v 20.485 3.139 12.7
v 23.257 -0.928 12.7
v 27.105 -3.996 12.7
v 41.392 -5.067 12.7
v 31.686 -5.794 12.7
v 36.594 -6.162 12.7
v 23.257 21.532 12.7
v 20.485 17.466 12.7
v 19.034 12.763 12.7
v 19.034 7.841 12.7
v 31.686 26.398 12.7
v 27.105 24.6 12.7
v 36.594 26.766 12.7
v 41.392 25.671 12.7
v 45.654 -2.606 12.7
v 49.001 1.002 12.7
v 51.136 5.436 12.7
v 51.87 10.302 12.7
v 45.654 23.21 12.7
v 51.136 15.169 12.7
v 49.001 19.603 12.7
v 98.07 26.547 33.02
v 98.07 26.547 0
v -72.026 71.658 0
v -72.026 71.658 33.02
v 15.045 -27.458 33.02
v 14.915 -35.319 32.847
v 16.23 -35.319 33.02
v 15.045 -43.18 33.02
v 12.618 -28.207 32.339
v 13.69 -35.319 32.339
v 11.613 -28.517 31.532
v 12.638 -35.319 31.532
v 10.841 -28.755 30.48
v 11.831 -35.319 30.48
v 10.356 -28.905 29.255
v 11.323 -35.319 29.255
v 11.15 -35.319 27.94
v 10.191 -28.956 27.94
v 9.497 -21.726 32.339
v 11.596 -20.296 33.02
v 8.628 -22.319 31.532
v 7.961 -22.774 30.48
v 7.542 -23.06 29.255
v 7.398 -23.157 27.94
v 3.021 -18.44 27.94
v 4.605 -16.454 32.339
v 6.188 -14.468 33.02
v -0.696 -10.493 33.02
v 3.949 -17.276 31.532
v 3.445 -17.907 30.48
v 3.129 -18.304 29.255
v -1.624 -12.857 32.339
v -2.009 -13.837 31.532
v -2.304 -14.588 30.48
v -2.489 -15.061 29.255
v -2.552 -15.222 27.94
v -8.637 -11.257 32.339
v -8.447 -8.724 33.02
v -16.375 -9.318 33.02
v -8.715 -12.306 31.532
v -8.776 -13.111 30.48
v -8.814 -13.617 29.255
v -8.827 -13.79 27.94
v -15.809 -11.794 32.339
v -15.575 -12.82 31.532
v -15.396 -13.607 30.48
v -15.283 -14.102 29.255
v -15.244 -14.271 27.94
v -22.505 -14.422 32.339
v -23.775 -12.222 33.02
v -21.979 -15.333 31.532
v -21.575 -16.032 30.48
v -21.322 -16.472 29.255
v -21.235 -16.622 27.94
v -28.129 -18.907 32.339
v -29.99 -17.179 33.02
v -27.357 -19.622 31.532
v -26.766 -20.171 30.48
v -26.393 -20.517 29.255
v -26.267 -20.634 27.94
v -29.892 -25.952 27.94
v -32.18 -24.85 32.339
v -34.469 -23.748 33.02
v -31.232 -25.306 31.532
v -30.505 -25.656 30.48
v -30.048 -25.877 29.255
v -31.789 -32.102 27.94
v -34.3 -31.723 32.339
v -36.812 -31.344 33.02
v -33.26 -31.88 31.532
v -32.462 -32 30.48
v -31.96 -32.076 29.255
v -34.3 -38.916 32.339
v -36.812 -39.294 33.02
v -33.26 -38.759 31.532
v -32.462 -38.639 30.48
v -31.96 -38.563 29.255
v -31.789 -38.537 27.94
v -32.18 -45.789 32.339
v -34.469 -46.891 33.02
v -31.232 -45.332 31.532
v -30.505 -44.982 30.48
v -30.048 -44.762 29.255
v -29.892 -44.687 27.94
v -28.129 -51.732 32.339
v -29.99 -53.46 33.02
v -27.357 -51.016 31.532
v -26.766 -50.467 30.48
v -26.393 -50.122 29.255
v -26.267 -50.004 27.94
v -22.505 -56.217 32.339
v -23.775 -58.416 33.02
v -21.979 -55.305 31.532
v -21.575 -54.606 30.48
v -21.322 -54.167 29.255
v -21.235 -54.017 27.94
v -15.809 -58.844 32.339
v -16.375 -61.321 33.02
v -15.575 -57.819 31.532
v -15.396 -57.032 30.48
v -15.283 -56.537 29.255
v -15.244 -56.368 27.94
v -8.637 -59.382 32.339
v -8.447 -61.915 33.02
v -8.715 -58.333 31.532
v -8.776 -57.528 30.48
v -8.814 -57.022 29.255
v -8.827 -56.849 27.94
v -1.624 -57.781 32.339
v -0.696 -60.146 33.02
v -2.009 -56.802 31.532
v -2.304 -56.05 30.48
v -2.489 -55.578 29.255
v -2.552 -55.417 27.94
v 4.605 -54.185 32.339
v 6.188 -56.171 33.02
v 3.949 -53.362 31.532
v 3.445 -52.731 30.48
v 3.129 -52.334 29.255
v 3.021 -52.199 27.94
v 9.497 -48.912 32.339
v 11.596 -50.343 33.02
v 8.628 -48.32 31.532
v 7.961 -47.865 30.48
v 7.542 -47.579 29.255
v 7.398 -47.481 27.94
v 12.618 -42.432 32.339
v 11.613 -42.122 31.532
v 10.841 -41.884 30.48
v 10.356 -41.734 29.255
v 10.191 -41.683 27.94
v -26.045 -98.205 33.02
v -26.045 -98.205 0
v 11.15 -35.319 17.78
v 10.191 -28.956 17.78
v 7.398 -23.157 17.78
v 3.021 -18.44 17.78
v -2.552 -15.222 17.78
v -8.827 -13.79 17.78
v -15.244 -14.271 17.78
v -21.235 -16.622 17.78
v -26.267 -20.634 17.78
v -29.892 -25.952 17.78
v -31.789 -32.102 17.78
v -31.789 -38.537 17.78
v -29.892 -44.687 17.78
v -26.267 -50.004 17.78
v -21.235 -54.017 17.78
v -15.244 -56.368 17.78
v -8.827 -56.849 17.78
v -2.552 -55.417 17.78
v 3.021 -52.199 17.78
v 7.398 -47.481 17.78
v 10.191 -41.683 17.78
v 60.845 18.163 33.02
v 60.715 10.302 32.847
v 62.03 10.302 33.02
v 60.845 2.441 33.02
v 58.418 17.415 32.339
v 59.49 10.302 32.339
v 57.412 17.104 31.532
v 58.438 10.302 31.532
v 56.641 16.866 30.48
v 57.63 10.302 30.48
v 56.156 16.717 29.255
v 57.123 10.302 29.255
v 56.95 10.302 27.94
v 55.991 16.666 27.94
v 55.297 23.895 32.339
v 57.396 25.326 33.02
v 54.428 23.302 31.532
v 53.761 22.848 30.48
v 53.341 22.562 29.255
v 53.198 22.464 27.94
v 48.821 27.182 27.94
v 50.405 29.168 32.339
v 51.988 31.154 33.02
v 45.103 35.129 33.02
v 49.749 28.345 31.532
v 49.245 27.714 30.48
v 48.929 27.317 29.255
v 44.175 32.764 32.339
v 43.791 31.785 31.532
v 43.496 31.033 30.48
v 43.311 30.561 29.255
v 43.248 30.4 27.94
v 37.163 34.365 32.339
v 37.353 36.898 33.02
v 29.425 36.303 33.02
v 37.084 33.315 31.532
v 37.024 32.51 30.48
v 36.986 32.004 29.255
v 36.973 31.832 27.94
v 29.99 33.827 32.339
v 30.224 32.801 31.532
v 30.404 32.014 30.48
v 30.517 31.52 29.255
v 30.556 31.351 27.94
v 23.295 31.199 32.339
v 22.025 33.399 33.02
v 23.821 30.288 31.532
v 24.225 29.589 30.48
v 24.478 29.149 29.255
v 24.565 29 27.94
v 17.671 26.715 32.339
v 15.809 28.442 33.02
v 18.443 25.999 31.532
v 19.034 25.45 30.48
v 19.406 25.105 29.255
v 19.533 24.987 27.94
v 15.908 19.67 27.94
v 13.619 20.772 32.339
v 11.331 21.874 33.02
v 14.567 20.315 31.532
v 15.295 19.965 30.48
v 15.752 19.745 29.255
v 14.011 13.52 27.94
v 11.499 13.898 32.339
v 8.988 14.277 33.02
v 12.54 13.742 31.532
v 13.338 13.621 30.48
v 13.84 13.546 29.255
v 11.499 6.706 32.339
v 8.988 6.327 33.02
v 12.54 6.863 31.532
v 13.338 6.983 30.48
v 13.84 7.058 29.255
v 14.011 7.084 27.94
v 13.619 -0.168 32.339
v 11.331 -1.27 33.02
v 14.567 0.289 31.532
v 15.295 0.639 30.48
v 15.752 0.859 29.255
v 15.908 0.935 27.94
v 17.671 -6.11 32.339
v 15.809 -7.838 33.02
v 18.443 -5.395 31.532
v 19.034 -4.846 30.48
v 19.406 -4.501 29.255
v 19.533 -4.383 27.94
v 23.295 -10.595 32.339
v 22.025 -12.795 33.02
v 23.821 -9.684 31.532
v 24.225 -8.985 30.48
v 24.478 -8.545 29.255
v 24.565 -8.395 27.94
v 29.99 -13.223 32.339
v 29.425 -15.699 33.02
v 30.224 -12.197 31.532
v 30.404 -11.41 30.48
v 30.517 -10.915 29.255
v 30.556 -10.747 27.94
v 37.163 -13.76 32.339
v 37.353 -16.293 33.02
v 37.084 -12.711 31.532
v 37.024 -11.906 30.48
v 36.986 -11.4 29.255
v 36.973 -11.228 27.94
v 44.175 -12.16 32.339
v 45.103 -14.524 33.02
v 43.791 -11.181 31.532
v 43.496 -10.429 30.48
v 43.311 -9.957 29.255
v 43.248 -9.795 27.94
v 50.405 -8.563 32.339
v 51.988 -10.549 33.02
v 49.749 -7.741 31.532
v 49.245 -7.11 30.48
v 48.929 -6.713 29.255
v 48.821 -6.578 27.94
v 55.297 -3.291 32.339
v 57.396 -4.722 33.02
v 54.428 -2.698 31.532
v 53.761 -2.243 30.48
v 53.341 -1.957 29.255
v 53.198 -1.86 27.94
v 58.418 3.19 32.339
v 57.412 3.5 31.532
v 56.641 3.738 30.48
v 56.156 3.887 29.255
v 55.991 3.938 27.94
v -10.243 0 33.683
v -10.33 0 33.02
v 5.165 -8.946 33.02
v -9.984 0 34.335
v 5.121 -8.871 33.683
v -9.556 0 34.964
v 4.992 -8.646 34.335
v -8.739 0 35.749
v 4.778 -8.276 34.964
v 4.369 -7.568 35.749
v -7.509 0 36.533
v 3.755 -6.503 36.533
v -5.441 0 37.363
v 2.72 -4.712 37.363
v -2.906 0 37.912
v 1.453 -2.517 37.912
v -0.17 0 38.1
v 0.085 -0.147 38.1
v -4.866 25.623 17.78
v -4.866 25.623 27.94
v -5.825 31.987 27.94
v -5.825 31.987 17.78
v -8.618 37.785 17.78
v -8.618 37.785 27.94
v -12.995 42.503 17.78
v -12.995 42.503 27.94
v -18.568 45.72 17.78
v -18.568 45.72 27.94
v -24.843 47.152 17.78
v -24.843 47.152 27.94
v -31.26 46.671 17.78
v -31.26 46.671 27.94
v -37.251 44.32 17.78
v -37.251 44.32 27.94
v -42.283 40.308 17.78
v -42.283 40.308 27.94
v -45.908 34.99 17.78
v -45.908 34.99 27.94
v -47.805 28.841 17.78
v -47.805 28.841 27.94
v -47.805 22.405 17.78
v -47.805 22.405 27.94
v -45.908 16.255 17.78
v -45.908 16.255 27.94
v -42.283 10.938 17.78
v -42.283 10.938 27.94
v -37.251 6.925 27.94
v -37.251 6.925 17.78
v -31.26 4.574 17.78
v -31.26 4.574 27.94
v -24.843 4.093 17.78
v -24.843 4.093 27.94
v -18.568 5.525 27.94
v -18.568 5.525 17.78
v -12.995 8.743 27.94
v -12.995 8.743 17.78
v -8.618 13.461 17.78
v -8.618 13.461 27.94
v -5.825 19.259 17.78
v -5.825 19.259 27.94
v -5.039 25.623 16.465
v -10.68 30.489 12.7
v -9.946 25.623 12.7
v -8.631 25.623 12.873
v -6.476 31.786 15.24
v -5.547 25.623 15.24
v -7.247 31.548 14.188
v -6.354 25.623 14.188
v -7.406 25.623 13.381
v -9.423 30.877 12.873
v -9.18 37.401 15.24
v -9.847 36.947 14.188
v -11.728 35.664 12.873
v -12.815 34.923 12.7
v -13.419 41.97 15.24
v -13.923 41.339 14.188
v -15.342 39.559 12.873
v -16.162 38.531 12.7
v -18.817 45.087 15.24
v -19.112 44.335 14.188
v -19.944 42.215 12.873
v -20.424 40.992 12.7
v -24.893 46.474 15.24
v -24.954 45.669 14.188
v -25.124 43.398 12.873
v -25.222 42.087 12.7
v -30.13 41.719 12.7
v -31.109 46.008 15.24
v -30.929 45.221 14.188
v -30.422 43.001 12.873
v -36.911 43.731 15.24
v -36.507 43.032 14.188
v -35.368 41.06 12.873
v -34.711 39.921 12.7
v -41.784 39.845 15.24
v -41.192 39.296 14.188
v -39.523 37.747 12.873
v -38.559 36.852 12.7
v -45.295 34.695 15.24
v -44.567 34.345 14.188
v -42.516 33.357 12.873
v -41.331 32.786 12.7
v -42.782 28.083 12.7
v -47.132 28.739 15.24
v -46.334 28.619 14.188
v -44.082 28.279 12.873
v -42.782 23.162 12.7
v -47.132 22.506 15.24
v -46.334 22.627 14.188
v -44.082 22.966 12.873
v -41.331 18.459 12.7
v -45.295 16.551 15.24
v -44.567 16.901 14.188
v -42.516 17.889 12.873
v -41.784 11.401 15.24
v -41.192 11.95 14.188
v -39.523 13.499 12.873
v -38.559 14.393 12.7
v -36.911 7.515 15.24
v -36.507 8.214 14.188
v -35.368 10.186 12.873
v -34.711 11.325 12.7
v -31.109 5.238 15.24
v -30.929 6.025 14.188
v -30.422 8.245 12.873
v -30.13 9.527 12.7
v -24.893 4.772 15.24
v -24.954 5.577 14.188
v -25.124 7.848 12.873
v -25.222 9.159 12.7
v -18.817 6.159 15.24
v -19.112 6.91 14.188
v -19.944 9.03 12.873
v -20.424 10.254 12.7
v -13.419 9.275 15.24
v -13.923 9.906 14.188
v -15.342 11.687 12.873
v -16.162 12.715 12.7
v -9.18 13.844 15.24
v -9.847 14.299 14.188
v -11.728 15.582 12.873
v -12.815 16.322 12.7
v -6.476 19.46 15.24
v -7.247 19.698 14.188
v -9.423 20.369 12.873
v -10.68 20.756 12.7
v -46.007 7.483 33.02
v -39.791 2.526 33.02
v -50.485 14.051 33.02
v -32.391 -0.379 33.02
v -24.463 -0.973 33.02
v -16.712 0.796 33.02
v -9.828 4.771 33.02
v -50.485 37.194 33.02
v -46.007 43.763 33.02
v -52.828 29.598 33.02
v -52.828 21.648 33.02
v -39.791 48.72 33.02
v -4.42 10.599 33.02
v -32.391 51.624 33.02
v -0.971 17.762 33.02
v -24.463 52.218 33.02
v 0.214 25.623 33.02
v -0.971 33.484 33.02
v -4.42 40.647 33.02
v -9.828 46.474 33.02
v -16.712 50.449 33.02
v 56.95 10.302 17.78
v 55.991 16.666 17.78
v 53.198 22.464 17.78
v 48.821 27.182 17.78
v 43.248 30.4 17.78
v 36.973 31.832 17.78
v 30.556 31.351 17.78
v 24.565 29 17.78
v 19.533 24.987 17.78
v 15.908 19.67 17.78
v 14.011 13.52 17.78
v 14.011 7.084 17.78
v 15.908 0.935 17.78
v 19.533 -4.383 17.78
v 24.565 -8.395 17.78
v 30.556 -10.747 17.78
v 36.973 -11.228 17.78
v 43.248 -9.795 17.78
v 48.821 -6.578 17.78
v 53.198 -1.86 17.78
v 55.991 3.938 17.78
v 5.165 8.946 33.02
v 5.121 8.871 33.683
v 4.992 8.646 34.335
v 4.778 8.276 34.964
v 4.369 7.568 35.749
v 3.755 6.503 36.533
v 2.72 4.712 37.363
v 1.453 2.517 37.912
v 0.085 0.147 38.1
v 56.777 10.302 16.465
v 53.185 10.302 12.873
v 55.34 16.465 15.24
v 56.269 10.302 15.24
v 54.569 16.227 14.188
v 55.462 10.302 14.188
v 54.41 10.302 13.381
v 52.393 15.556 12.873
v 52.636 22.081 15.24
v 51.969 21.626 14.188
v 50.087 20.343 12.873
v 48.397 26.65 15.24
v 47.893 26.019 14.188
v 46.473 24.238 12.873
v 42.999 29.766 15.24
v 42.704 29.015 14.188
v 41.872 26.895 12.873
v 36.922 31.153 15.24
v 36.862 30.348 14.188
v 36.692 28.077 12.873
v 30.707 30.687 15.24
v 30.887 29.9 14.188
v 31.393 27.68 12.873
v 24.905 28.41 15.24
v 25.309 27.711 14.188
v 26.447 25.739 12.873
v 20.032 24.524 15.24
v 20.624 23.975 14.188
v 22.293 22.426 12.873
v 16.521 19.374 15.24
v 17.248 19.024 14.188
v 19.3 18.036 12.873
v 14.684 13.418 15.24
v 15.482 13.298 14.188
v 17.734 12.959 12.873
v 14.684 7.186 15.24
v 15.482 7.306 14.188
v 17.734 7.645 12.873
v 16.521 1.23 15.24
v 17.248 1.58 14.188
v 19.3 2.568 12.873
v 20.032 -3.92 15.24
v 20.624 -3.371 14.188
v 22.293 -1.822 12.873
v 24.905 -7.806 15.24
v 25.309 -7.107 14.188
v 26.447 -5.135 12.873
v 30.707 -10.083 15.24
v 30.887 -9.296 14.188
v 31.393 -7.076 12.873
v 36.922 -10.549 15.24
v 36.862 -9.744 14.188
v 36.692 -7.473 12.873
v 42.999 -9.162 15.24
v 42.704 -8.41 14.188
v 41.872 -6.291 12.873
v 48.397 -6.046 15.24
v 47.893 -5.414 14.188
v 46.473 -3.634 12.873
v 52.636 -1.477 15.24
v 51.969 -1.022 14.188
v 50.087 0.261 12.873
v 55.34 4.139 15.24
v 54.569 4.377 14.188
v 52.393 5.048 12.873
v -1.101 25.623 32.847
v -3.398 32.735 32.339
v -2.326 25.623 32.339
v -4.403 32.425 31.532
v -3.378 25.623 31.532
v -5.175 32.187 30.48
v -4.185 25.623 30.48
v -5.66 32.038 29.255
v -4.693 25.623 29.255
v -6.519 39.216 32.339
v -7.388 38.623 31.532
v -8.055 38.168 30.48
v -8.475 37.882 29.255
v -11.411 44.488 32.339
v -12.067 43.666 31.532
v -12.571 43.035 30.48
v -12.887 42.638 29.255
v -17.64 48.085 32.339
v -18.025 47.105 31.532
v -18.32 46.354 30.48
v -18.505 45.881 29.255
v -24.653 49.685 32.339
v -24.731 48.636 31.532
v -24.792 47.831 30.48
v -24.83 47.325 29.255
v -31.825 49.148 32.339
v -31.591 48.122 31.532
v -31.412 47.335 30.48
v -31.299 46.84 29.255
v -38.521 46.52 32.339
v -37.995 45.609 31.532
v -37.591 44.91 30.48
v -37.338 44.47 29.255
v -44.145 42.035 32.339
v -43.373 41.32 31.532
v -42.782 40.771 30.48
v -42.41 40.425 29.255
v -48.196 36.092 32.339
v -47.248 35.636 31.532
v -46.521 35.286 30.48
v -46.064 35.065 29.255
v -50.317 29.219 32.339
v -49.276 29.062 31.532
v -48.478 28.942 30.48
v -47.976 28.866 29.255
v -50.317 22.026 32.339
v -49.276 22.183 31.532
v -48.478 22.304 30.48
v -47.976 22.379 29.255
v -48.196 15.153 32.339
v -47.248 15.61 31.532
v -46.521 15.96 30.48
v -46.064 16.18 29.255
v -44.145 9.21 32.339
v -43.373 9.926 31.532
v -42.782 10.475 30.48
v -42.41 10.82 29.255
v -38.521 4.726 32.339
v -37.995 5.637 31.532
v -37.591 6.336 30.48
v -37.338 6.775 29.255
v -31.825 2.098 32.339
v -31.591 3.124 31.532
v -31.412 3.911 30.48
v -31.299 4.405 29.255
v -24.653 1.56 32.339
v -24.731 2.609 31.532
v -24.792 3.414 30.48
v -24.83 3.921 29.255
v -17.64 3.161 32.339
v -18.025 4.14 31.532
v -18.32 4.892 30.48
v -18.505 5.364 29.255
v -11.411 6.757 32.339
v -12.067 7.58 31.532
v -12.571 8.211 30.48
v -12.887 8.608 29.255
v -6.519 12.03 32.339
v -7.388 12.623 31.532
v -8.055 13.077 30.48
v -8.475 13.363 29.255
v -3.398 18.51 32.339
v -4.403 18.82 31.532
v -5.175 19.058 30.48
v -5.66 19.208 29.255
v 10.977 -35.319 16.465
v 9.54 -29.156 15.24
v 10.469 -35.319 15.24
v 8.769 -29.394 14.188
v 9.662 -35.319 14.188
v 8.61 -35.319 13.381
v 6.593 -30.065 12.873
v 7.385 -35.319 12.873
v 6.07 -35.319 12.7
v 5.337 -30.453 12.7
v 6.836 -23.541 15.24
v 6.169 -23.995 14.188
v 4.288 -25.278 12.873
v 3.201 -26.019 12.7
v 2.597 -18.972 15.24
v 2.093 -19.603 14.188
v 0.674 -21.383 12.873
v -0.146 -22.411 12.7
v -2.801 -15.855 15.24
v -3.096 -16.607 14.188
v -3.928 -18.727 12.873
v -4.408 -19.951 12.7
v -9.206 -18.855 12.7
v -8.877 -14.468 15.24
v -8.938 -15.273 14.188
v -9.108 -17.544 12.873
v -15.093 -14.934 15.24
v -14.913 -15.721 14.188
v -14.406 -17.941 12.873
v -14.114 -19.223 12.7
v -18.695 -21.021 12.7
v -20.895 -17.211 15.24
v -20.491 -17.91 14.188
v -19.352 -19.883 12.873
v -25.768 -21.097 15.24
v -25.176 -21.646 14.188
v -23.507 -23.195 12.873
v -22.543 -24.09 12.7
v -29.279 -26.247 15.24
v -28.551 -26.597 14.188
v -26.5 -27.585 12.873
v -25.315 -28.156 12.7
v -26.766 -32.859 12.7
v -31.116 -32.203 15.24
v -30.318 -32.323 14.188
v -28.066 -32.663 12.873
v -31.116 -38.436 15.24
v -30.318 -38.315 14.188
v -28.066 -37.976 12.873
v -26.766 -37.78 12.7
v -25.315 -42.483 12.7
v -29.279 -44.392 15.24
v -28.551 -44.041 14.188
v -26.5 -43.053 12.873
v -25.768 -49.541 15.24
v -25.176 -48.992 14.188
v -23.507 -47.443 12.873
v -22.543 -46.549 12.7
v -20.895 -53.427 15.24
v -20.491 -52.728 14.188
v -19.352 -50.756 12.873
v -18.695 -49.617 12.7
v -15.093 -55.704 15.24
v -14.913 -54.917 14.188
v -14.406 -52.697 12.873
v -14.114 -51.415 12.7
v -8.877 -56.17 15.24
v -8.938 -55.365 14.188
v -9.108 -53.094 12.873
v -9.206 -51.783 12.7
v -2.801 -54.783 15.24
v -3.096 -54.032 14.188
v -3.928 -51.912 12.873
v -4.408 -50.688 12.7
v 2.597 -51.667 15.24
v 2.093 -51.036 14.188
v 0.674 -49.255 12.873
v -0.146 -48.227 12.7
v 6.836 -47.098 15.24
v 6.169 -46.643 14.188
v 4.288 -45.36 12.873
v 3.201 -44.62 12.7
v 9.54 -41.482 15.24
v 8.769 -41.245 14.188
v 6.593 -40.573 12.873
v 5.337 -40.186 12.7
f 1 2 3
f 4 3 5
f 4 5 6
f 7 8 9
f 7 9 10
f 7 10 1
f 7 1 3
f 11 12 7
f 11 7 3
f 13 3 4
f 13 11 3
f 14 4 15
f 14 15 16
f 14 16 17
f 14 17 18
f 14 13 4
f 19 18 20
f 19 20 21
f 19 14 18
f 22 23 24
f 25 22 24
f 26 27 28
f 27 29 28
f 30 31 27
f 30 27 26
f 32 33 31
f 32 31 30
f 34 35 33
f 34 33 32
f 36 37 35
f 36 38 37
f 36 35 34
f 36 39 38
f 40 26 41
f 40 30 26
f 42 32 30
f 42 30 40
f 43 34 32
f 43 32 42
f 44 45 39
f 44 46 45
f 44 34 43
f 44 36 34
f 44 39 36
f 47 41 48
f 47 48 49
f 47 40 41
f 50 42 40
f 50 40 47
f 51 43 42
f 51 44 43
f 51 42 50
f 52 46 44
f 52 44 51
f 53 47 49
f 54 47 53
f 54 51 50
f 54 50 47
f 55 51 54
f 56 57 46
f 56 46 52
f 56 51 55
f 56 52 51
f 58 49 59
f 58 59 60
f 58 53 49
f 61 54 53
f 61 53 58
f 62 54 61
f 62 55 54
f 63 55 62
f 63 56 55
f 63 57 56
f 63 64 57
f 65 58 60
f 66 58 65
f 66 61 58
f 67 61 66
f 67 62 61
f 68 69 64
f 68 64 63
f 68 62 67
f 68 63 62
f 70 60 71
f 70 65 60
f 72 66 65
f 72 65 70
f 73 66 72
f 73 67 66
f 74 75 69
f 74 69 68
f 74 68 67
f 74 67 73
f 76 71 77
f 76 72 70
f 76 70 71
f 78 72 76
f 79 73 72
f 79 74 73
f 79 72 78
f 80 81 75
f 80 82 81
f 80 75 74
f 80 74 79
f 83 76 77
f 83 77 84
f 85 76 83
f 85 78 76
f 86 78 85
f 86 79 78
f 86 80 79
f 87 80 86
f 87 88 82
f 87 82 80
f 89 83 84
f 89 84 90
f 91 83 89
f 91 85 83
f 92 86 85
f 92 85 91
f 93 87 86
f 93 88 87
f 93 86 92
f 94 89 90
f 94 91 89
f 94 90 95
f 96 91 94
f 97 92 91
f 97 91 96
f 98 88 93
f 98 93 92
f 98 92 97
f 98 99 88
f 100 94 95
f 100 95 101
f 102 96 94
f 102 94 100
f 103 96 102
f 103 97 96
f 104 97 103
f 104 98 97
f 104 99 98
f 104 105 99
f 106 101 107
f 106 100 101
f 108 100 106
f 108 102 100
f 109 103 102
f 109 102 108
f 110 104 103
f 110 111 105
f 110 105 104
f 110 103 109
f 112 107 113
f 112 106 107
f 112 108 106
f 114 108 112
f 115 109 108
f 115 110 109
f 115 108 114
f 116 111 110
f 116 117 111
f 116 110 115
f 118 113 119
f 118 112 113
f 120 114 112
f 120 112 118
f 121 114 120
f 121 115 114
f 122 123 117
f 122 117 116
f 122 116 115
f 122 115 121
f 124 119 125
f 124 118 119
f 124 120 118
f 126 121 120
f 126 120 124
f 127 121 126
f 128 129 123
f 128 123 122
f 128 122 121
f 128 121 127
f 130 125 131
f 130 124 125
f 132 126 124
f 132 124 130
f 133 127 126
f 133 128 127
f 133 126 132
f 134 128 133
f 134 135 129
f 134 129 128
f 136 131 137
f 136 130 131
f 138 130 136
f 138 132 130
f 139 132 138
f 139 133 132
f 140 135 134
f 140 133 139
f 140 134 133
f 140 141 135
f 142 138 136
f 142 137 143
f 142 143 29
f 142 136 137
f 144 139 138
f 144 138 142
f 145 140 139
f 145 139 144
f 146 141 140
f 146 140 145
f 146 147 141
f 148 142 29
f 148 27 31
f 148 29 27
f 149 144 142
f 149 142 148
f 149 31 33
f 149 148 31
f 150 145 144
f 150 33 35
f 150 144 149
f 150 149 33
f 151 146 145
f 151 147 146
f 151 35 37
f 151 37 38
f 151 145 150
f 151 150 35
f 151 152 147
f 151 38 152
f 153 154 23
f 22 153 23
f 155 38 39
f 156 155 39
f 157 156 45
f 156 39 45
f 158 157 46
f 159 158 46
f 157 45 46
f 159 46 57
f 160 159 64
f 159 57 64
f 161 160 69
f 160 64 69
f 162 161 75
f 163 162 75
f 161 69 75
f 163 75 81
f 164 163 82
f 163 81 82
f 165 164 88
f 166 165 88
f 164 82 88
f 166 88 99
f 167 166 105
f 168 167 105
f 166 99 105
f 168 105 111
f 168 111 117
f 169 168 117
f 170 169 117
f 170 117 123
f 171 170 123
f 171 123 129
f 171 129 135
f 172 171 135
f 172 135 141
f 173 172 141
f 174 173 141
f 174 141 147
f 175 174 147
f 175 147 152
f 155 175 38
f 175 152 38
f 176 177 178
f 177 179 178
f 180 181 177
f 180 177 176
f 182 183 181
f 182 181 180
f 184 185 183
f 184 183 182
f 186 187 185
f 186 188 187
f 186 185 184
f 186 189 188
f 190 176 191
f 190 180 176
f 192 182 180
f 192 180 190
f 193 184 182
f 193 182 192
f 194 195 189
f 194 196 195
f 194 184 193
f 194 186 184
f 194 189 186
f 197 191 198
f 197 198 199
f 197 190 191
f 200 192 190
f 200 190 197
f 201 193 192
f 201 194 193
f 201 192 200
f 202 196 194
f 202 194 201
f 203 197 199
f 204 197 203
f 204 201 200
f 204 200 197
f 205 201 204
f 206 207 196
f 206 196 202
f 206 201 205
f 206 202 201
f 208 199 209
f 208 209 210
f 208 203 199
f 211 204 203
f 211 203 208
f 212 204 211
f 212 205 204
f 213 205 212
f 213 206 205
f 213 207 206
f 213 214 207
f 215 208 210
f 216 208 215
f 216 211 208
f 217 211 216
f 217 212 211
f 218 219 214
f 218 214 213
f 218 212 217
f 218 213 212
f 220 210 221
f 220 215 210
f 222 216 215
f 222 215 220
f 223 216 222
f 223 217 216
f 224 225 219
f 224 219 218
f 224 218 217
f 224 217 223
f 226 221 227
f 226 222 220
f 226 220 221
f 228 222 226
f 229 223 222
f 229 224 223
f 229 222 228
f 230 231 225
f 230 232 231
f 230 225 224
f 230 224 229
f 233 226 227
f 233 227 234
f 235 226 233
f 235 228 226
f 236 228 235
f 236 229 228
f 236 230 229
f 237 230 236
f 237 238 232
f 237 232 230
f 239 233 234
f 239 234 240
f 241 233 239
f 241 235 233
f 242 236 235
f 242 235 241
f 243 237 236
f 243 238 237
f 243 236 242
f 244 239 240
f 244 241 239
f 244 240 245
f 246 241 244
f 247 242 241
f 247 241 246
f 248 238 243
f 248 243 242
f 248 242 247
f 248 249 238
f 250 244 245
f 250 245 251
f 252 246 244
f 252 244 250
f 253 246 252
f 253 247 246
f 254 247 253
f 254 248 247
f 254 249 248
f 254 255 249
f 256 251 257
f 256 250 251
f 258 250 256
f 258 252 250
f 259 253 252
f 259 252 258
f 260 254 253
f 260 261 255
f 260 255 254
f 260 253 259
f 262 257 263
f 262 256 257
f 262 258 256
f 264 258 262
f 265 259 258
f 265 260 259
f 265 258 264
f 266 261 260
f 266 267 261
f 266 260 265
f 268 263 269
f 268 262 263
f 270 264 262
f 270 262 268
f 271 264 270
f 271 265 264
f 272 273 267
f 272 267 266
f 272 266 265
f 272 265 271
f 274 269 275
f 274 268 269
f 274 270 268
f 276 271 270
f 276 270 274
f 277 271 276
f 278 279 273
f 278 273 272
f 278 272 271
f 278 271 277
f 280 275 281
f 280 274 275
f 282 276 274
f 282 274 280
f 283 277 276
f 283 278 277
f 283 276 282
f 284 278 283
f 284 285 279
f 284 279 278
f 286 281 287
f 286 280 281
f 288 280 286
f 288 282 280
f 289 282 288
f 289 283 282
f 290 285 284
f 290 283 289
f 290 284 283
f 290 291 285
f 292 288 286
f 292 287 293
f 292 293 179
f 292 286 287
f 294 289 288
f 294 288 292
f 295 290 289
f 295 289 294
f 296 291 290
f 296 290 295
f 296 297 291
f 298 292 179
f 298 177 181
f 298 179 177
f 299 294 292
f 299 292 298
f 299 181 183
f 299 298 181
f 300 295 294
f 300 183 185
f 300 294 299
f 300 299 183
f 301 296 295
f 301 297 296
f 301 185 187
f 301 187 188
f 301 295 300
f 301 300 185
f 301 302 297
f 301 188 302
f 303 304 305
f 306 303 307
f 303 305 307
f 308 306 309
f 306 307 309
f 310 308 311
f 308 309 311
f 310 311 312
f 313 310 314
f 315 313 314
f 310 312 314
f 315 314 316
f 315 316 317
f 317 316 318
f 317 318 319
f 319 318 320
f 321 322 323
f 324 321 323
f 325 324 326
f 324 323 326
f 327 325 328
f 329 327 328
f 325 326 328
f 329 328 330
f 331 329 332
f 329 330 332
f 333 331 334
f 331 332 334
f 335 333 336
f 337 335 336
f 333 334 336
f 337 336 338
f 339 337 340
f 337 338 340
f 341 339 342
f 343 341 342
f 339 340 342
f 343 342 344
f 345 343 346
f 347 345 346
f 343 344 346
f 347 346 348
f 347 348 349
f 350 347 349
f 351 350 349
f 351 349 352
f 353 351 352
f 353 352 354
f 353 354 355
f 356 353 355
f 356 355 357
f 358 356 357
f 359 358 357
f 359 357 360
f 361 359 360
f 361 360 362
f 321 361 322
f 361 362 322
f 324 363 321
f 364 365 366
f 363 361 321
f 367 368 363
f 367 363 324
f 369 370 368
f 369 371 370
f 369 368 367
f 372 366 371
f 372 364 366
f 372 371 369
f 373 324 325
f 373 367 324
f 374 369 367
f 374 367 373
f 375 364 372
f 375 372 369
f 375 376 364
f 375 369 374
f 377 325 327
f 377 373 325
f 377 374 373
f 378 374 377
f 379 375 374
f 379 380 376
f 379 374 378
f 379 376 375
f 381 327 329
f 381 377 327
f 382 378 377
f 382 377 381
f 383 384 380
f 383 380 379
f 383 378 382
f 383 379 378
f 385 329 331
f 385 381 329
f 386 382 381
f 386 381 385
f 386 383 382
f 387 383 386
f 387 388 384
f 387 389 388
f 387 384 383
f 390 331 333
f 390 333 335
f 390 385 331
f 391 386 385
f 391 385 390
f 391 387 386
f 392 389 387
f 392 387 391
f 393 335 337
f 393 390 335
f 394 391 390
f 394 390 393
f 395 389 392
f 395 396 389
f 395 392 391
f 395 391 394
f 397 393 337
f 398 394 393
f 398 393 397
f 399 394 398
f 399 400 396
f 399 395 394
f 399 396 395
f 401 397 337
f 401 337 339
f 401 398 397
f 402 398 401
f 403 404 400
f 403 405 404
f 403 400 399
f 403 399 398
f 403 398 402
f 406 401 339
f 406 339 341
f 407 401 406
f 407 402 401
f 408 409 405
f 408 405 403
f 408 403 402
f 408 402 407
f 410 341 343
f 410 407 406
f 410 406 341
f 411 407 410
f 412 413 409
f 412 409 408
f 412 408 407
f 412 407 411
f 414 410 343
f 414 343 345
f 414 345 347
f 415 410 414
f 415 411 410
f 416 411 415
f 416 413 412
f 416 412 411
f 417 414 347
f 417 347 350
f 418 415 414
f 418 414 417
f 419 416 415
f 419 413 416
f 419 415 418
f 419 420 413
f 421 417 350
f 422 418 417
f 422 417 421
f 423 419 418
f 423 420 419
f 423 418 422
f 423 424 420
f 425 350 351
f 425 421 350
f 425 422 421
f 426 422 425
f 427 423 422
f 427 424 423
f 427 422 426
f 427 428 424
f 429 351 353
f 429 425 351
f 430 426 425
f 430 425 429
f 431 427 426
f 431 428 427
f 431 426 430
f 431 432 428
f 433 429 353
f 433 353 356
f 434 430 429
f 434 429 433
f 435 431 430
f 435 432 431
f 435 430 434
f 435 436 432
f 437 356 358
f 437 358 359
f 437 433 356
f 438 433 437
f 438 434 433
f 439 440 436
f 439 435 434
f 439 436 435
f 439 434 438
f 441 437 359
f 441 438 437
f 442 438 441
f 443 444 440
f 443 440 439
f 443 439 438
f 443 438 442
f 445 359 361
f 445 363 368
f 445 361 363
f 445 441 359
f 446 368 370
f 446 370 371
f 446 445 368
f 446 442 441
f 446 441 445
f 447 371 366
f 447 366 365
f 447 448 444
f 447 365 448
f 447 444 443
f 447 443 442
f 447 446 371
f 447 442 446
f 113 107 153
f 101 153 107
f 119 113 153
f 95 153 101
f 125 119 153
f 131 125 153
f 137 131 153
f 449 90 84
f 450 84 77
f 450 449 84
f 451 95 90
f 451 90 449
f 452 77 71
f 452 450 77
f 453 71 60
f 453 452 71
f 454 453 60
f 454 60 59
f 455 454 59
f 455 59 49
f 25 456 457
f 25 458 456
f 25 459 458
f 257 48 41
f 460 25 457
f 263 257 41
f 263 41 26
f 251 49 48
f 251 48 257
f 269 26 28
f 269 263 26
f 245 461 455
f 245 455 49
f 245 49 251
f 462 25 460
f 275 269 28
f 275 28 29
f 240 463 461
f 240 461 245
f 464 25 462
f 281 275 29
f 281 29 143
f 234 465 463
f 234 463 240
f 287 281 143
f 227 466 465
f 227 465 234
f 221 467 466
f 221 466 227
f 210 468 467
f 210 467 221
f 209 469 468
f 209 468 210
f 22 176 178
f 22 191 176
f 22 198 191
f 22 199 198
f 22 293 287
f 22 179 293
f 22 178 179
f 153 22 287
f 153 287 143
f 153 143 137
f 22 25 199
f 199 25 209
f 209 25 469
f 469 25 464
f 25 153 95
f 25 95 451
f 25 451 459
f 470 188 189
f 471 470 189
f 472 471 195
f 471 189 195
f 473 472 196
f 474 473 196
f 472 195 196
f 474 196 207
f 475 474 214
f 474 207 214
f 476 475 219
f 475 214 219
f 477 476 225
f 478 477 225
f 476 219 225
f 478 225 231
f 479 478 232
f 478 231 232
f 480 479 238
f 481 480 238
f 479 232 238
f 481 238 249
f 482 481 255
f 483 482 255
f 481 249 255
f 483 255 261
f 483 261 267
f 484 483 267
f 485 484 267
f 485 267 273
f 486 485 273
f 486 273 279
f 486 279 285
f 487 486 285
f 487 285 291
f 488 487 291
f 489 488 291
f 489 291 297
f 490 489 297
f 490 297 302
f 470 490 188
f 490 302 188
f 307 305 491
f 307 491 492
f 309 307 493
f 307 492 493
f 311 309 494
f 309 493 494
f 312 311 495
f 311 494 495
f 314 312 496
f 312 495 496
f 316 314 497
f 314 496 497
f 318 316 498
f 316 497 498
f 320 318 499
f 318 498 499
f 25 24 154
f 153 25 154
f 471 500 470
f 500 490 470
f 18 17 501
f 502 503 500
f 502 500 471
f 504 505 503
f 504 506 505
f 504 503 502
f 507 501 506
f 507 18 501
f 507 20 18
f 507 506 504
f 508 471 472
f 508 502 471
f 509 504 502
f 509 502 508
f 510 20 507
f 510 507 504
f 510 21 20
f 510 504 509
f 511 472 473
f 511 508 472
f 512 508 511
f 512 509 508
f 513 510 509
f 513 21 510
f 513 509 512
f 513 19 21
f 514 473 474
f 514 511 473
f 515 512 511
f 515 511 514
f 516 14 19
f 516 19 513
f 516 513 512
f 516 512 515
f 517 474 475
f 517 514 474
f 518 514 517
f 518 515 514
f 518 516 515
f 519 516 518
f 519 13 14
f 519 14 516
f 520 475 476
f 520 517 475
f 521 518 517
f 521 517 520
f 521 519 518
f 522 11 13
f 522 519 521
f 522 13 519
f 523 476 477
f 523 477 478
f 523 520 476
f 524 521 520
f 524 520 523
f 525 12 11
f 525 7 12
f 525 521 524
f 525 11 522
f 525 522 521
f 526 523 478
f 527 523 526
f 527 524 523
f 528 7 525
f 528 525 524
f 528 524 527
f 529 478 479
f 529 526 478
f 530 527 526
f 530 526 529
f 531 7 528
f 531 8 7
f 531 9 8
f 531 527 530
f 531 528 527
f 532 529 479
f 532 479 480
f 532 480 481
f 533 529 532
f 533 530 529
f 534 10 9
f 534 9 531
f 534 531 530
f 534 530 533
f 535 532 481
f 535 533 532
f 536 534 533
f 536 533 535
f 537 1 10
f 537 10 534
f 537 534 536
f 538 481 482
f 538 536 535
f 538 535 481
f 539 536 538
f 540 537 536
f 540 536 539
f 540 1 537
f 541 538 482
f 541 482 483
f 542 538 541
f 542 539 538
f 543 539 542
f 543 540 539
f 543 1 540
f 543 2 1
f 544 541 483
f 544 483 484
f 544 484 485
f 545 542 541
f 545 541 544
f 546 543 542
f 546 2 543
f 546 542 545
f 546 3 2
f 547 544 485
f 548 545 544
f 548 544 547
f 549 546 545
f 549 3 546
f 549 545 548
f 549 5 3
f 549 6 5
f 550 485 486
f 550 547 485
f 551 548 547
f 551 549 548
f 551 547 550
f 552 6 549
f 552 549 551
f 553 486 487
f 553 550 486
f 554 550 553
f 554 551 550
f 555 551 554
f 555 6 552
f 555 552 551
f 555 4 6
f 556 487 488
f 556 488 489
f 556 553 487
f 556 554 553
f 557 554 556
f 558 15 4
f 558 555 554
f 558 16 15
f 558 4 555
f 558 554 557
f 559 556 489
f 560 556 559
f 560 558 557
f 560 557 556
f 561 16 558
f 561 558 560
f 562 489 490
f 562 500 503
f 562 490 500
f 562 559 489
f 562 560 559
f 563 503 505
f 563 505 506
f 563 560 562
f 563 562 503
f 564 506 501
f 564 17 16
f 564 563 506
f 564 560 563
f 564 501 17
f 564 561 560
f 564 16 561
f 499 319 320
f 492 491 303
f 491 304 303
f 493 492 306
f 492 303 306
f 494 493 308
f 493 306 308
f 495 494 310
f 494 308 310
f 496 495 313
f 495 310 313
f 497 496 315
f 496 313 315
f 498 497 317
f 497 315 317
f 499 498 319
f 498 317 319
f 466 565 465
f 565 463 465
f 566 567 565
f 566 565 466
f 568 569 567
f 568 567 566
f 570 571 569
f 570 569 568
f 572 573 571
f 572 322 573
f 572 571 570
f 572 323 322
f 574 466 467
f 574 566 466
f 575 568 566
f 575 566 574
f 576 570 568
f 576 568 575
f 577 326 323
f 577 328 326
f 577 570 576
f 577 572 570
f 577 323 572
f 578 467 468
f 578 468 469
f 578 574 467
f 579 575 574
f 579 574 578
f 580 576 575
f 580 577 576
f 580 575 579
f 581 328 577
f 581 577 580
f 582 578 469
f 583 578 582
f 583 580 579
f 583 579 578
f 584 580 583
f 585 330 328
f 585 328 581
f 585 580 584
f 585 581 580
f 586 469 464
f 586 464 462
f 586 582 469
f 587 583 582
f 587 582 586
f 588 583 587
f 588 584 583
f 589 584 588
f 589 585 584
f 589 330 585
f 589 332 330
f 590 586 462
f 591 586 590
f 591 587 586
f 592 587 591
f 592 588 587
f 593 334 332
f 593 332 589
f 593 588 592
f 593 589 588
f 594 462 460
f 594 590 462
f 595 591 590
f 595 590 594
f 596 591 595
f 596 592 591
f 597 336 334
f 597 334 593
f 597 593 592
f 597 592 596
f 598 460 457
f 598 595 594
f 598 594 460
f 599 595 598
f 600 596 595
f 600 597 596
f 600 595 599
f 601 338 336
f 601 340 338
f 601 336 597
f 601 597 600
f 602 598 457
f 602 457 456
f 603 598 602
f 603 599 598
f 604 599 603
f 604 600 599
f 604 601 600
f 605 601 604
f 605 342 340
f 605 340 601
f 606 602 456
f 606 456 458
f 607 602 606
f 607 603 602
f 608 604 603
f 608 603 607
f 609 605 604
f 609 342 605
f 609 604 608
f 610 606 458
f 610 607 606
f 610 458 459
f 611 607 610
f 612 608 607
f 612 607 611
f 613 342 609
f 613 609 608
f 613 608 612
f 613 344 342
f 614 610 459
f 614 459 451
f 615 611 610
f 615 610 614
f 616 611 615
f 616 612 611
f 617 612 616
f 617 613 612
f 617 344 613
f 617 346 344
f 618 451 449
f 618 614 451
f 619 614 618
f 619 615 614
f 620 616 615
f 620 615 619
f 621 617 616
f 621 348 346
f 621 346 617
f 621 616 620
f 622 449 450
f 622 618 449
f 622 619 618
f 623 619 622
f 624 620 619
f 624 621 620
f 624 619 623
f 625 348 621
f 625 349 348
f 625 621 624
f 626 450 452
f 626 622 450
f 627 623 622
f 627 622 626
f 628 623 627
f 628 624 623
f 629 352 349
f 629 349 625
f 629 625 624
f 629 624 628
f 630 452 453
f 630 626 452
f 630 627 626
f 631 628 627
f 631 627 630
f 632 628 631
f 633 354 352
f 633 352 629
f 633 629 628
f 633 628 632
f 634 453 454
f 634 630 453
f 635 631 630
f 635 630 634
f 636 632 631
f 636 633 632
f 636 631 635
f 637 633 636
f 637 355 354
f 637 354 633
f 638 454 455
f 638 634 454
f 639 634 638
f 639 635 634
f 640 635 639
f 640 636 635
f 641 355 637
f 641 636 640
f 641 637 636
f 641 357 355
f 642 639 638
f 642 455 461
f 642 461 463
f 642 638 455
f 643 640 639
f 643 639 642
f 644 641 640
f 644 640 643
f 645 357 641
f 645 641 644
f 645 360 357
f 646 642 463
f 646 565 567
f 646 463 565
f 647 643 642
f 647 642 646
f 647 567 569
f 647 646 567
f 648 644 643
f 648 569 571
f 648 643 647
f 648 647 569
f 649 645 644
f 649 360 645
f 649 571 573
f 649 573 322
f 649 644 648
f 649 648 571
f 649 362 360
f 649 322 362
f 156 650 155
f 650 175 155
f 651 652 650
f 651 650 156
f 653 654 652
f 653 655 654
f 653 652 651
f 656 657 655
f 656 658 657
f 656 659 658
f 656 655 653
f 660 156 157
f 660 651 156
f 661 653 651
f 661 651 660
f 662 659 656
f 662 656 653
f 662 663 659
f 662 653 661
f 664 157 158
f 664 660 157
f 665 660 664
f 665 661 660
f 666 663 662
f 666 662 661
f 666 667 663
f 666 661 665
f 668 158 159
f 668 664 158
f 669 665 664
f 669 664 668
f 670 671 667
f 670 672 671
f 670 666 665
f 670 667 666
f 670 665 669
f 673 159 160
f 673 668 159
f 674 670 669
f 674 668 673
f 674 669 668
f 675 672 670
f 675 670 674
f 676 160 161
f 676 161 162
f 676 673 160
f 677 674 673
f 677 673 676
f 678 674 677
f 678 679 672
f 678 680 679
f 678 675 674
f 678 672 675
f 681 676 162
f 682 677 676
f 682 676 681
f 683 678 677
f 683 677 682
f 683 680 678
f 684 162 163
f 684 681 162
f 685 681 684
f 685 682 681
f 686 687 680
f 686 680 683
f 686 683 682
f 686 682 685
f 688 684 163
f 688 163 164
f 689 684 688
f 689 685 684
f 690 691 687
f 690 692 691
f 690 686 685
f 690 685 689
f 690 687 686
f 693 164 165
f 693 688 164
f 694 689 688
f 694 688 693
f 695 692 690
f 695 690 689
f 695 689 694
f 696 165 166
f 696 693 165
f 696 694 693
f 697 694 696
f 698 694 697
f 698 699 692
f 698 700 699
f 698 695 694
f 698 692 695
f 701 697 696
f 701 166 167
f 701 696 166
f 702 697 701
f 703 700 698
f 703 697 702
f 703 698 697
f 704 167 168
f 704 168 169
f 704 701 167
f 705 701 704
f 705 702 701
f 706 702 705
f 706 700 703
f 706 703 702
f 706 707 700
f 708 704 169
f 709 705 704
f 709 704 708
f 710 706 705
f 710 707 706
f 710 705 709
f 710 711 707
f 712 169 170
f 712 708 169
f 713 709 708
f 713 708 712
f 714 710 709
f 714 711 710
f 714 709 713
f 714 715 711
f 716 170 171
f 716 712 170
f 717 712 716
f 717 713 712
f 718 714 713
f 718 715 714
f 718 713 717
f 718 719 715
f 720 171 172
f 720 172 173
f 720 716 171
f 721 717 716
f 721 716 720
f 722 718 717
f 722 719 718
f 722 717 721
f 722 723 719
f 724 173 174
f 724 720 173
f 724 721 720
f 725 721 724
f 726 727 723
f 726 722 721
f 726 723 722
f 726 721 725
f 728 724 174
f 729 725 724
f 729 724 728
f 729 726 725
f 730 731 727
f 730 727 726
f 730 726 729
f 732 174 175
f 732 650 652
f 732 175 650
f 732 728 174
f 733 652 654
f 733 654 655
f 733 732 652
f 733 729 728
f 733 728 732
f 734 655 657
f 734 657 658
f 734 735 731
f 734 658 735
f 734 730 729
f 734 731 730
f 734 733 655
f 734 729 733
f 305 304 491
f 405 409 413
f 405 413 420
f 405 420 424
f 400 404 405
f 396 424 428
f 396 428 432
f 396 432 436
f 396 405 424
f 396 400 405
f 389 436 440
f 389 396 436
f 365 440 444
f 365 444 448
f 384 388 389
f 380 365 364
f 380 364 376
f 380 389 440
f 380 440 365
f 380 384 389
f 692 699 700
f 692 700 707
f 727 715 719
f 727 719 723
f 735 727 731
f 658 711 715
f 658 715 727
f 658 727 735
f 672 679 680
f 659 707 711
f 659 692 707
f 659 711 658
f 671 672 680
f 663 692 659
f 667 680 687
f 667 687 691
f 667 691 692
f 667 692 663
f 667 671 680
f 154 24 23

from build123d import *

# Parameters (mm, degrees)
F1_DEPTH = 33.02
F2_R     = 21.59
F3_DEPTH = 20.32
F4_R     = 5.08
F6_DEPTH = 5.08
F7_R     = 5.07999


# Not quite as in the source:
# - a fillet or chamfer is up to 0.001 mm smaller than in the source, because OpenCascade refuses the exact size


with BuildPart() as f1:
    # F0 (on Top) → F1 (new body)
    with BuildSketch(Plane.XY):
        Polygon((-26.044934144, -98.2049968455), (98.0704891188, 26.5469238142), (-72.0255549748, 71.6580730314), align=None)
    extrude(amount=F1_DEPTH)

    # F2 (on face) → F3 (cut)
    with BuildSketch(Plane.XY.offset(33.02)):
        with Locations((-26.4560222886, 25.6227981428)):
            Circle(F2_R)
        with Locations((-10.44000236, -35.3193325351)):
            Circle(F2_R)
        with Locations((35.3598029055, 10.3020987419)):
            Circle(F2_R)
    extrude(amount=-F3_DEPTH, mode=Mode.SUBTRACT)

    # F4
    f4_edges = [f1.edges().sort_by_distance(p)[0] for p in [
        (-48.046022, 25.622798, 33.02),
        (-32.030002, -35.319333, 33.02),
        (13.769803, 10.302099, 33.02),
        (-48.046022, 25.622798, 12.7),
        (-32.030002, -35.319333, 12.7),
        (13.769803, 10.302099, 12.7),
    ]]
    fillet(f4_edges, radius=F4_R)


with BuildPart() as f6:
    # F5 (on face) → F6 (new body)
    with BuildSketch(Plane.XY.offset(33.02)):
        Polygon((5.164898932, -8.9458673661), (5.164898932, 8.9458673661), (-10.329797864, 0), align=None)
    extrude(amount=F6_DEPTH)

    # F7 (radius 5.08 in the source; OpenCascade refuses exactly that, so slightly less here)
    f7_edges = [f6.edges().sort_by_distance(p)[0] for p in [
        (5.164899, 0, 38.1),
        (-2.582449, -4.472934, 38.1),
        (-2.582449, 4.472934, 38.1),
    ]]
    fillet(f7_edges, radius=F7_R)


solid = Compound([f1.part, f6.part])
